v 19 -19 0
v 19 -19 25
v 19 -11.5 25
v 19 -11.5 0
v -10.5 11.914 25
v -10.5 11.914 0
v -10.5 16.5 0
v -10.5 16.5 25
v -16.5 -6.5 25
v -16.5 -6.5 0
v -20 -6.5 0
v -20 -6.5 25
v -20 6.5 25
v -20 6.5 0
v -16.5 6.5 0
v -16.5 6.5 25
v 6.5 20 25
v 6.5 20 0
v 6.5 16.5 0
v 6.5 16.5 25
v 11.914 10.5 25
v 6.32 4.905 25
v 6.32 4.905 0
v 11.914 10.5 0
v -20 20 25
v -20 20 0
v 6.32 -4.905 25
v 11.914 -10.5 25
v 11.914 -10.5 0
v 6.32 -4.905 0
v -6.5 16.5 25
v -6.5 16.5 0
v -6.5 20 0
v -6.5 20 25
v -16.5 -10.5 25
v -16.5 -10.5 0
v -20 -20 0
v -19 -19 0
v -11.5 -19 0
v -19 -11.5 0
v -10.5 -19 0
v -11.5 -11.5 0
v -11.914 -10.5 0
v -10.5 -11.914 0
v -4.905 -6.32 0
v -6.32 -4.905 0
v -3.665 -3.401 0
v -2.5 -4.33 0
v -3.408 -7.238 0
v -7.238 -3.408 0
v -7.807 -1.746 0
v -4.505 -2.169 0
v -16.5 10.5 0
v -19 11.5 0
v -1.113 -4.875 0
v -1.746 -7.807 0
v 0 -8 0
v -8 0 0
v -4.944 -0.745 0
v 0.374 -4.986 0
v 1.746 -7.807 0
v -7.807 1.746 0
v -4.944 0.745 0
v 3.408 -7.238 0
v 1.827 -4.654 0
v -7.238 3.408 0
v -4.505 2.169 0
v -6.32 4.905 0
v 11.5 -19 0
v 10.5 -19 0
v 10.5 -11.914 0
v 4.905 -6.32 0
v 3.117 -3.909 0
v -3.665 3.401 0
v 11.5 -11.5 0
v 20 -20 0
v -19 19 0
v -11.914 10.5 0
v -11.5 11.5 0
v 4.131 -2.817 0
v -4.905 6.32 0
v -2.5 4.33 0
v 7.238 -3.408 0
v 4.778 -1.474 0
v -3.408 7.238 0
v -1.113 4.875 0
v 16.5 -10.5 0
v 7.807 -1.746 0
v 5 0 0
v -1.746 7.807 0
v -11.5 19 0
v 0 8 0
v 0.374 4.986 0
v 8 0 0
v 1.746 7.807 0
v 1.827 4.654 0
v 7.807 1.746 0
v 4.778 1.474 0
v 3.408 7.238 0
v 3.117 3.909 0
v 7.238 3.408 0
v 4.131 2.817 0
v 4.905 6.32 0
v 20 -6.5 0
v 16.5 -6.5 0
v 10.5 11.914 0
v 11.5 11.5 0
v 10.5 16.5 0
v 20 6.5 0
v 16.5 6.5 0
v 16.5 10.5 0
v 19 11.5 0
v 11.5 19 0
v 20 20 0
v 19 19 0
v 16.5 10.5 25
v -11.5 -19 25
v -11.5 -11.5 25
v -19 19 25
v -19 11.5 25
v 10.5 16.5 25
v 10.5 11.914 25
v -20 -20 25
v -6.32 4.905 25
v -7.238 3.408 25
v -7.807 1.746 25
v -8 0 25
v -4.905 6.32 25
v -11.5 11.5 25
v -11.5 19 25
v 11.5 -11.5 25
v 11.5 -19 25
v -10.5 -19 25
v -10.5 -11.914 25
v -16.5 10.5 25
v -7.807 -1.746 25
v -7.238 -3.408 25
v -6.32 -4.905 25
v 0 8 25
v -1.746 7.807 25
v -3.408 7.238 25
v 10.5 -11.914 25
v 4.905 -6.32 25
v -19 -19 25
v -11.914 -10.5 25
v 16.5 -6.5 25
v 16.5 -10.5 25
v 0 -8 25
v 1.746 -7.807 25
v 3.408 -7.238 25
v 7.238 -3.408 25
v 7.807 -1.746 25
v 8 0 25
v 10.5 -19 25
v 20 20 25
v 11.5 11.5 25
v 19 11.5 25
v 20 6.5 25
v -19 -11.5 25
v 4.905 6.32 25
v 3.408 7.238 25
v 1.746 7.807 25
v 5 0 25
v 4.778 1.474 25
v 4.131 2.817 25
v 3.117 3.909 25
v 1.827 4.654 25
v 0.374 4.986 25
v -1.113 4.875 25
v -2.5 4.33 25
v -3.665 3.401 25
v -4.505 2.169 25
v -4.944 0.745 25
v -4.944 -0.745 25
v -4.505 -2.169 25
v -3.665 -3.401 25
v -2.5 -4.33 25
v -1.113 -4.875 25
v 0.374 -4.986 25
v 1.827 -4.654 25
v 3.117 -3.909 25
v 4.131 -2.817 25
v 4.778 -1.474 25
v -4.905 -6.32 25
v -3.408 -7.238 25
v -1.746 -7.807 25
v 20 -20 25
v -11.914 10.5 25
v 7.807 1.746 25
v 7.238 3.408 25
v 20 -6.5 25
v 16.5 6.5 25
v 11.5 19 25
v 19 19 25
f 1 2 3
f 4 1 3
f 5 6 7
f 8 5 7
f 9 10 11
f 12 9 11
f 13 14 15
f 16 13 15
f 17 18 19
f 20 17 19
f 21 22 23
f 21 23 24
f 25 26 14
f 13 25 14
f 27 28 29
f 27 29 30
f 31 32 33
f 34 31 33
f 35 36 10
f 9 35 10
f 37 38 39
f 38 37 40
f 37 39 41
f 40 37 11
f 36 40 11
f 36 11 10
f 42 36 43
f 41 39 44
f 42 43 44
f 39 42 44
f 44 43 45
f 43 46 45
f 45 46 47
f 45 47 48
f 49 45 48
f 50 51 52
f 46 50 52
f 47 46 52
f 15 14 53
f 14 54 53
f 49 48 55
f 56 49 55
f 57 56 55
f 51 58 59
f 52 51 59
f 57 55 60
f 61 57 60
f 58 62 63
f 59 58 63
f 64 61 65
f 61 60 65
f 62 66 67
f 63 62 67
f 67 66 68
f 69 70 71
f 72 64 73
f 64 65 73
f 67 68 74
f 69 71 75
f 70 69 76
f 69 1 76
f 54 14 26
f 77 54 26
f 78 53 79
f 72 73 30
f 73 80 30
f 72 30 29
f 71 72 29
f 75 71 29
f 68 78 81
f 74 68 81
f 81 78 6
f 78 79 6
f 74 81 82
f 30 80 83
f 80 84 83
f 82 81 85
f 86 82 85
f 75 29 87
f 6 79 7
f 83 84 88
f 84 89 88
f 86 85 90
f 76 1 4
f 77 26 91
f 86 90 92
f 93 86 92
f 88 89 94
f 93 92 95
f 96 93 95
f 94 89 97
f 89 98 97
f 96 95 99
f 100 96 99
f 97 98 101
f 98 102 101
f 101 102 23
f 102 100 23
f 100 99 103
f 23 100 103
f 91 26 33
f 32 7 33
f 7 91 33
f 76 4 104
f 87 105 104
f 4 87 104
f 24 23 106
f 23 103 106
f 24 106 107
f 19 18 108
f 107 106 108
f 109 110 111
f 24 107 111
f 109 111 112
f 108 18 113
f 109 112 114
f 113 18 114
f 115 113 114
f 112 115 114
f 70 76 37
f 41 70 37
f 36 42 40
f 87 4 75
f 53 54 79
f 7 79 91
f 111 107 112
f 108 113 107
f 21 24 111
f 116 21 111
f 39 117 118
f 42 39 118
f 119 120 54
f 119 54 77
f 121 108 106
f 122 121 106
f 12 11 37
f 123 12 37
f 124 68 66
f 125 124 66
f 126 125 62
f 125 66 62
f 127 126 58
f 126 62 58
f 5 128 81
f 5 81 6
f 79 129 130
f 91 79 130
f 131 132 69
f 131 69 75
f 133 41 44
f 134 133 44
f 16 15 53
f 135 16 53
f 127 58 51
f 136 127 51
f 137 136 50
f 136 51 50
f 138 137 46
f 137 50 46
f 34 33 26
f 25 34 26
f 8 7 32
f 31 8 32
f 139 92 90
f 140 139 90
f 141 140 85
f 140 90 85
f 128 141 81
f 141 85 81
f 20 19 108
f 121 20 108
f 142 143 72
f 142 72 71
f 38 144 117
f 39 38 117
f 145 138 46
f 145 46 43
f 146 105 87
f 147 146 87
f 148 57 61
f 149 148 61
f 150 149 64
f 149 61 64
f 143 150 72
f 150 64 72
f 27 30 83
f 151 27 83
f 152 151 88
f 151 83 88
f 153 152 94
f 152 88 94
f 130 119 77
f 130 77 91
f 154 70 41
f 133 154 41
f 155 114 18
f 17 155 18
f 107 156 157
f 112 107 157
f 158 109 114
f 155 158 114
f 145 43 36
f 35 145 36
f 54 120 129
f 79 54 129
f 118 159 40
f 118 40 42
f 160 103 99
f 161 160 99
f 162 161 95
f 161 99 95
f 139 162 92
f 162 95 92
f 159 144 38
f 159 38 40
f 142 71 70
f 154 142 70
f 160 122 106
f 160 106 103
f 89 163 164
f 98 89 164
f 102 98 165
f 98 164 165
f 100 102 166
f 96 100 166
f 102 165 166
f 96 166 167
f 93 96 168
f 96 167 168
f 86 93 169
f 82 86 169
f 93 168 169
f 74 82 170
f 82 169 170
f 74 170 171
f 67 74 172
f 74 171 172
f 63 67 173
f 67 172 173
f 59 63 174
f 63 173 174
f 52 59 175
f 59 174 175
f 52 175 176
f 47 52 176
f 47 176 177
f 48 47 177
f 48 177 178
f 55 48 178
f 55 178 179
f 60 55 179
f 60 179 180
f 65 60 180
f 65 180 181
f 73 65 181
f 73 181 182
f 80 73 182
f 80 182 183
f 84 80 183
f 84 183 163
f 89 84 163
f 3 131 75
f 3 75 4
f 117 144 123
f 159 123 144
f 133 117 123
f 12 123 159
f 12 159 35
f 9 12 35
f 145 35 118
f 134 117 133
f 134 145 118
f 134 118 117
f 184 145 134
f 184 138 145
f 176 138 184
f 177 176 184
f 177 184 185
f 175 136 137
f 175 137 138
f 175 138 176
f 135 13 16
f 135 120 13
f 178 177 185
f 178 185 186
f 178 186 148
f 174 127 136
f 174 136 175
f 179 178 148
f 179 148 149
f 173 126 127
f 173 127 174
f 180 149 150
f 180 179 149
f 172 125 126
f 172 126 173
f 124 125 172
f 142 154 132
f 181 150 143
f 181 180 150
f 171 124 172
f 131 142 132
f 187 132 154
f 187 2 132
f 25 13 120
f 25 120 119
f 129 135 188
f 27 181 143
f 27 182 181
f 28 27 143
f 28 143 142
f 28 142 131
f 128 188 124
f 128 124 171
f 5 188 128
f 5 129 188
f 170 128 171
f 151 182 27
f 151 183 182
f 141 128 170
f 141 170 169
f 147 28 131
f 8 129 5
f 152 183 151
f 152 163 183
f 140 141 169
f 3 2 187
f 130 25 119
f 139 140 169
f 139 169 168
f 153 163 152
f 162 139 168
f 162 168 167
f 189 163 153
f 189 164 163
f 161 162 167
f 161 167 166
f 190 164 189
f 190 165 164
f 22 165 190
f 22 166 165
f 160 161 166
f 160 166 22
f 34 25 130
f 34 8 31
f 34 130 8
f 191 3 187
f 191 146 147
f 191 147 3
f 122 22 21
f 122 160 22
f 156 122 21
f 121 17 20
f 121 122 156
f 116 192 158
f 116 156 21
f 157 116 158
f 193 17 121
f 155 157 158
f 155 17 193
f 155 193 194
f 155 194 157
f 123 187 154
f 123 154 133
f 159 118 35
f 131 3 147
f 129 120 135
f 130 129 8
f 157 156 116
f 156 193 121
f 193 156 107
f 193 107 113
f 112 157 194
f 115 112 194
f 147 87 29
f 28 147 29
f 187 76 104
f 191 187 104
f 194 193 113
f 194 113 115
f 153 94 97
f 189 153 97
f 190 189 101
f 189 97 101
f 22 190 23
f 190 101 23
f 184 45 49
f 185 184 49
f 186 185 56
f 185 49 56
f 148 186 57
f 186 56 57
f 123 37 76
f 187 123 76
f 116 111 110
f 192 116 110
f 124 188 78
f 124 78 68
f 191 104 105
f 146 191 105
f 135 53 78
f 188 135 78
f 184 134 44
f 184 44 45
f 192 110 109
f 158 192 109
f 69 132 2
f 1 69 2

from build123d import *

# Parameters (mm, degrees)
F0_W     = 7.5
F0_H     = 7.5
F1_DEPTH = 25
F2_R     = 5
F3_DEPTH = 25.001


with BuildPart() as f1:
    # F0 (on Top) → F1 (new body)
    with BuildSketch(Plane.XY):
        with BuildLine():
            Line((20, 6.5), (20, 20))
            Line((20, 20), (6.5, 20))
            Line((6.5, 20), (6.5, 16.5))
            Line((6.5, 16.5), (10.5, 16.5))
            Line((10.5, 16.5), (10.5, 11.914214))
            Line((10.5, 11.914214), (4.905379, 6.319593))
            ThreePointArc((4.905379, 6.319593), (2.59261, 7.568248), (0, 8))
            ThreePointArc((0, 8), (-2.59261, 7.568248), (-4.905379, 6.319593))
            Line((-4.905379, 6.319593), (-10.5, 11.914214))
            Line((-10.5, 11.914214), (-10.5, 16.5))
            Line((-10.5, 16.5), (-6.5, 16.5))
            Line((-6.5, 16.5), (-6.5, 20))
            Line((-6.5, 20), (-20, 20))
            Line((-20, 20), (-20, 6.5))
            Line((-20, 6.5), (-16.5, 6.5))
            Line((-16.5, 6.5), (-16.5, 10.5))
            Line((-16.5, 10.5), (-11.914214, 10.5))
            Line((-11.914214, 10.5), (-6.319593, 4.905379))
            ThreePointArc((-6.319593, 4.905379), (-7.568248, 2.59261), (-8, 0))
            ThreePointArc((-8, 0), (-7.568248, -2.59261), (-6.319593, -4.905379))
            Line((-6.319593, -4.905379), (-11.914214, -10.5))
            Line((-11.914214, -10.5), (-16.5, -10.5))
            Line((-16.5, -10.5), (-16.5, -6.5))
            Line((-16.5, -6.5), (-20, -6.5))
            Line((-20, -6.5), (-20, -20))
            Line((-20, -20), (20, -20))
            Line((20, -20), (20, -6.5))
            Line((20, -6.5), (16.5, -6.5))
            Line((16.5, -6.5), (16.5, -10.5))
            Line((16.5, -10.5), (11.914214, -10.5))
            Line((11.914214, -10.5), (6.319593, -4.905379))
            ThreePointArc((6.319593, -4.905379), (7.568248, -2.59261), (8, 0))
            ThreePointArc((8, 0), (7.568248, 2.59261), (6.319593, 4.905379))
            Line((6.319593, 4.905379), (11.914214, 10.5))
            Line((11.914214, 10.5), (16.5, 10.5))
            Line((16.5, 10.5), (16.5, 6.5))
            Line((16.5, 6.5), (20, 6.5))
        make_face()
        with Locations((-15.25, -15.25)):
            Rectangle(F0_W, F0_H, mode=Mode.SUBTRACT)
        with BuildLine():
            Line((4.905379, -6.319593), (10.5, -11.914214))
            Line((10.5, -11.914214), (10.5, -19))
            Line((10.5, -19), (-10.5, -19))
            Line((-10.5, -19), (-10.5, -11.914214))
            Line((-10.5, -11.914214), (-4.905379, -6.319593))
            ThreePointArc((-4.905379, -6.319593), (-2.59261, -7.568248), (0, -8))
            ThreePointArc((0, -8), (2.59261, -7.568248), (4.905379, -6.319593))
        make_face(mode=Mode.SUBTRACT)
        with Locations((15.25, -15.25)):
            Rectangle(F0_W, F0_H, mode=Mode.SUBTRACT)
        with Locations((-15.25, 15.25)):
            Rectangle(F0_W, F0_H, mode=Mode.SUBTRACT)
        with Locations((15.25, 15.25)):
            Rectangle(F0_W, F0_H, mode=Mode.SUBTRACT)
    extrude(amount=F1_DEPTH)

    # F2 (on face) → F3 (cut, through all)
    with BuildSketch(Plane.XY.offset(25)):
        Circle(F2_R)
    extrude(amount=-F3_DEPTH, mode=Mode.SUBTRACT)


solid = f1.part
